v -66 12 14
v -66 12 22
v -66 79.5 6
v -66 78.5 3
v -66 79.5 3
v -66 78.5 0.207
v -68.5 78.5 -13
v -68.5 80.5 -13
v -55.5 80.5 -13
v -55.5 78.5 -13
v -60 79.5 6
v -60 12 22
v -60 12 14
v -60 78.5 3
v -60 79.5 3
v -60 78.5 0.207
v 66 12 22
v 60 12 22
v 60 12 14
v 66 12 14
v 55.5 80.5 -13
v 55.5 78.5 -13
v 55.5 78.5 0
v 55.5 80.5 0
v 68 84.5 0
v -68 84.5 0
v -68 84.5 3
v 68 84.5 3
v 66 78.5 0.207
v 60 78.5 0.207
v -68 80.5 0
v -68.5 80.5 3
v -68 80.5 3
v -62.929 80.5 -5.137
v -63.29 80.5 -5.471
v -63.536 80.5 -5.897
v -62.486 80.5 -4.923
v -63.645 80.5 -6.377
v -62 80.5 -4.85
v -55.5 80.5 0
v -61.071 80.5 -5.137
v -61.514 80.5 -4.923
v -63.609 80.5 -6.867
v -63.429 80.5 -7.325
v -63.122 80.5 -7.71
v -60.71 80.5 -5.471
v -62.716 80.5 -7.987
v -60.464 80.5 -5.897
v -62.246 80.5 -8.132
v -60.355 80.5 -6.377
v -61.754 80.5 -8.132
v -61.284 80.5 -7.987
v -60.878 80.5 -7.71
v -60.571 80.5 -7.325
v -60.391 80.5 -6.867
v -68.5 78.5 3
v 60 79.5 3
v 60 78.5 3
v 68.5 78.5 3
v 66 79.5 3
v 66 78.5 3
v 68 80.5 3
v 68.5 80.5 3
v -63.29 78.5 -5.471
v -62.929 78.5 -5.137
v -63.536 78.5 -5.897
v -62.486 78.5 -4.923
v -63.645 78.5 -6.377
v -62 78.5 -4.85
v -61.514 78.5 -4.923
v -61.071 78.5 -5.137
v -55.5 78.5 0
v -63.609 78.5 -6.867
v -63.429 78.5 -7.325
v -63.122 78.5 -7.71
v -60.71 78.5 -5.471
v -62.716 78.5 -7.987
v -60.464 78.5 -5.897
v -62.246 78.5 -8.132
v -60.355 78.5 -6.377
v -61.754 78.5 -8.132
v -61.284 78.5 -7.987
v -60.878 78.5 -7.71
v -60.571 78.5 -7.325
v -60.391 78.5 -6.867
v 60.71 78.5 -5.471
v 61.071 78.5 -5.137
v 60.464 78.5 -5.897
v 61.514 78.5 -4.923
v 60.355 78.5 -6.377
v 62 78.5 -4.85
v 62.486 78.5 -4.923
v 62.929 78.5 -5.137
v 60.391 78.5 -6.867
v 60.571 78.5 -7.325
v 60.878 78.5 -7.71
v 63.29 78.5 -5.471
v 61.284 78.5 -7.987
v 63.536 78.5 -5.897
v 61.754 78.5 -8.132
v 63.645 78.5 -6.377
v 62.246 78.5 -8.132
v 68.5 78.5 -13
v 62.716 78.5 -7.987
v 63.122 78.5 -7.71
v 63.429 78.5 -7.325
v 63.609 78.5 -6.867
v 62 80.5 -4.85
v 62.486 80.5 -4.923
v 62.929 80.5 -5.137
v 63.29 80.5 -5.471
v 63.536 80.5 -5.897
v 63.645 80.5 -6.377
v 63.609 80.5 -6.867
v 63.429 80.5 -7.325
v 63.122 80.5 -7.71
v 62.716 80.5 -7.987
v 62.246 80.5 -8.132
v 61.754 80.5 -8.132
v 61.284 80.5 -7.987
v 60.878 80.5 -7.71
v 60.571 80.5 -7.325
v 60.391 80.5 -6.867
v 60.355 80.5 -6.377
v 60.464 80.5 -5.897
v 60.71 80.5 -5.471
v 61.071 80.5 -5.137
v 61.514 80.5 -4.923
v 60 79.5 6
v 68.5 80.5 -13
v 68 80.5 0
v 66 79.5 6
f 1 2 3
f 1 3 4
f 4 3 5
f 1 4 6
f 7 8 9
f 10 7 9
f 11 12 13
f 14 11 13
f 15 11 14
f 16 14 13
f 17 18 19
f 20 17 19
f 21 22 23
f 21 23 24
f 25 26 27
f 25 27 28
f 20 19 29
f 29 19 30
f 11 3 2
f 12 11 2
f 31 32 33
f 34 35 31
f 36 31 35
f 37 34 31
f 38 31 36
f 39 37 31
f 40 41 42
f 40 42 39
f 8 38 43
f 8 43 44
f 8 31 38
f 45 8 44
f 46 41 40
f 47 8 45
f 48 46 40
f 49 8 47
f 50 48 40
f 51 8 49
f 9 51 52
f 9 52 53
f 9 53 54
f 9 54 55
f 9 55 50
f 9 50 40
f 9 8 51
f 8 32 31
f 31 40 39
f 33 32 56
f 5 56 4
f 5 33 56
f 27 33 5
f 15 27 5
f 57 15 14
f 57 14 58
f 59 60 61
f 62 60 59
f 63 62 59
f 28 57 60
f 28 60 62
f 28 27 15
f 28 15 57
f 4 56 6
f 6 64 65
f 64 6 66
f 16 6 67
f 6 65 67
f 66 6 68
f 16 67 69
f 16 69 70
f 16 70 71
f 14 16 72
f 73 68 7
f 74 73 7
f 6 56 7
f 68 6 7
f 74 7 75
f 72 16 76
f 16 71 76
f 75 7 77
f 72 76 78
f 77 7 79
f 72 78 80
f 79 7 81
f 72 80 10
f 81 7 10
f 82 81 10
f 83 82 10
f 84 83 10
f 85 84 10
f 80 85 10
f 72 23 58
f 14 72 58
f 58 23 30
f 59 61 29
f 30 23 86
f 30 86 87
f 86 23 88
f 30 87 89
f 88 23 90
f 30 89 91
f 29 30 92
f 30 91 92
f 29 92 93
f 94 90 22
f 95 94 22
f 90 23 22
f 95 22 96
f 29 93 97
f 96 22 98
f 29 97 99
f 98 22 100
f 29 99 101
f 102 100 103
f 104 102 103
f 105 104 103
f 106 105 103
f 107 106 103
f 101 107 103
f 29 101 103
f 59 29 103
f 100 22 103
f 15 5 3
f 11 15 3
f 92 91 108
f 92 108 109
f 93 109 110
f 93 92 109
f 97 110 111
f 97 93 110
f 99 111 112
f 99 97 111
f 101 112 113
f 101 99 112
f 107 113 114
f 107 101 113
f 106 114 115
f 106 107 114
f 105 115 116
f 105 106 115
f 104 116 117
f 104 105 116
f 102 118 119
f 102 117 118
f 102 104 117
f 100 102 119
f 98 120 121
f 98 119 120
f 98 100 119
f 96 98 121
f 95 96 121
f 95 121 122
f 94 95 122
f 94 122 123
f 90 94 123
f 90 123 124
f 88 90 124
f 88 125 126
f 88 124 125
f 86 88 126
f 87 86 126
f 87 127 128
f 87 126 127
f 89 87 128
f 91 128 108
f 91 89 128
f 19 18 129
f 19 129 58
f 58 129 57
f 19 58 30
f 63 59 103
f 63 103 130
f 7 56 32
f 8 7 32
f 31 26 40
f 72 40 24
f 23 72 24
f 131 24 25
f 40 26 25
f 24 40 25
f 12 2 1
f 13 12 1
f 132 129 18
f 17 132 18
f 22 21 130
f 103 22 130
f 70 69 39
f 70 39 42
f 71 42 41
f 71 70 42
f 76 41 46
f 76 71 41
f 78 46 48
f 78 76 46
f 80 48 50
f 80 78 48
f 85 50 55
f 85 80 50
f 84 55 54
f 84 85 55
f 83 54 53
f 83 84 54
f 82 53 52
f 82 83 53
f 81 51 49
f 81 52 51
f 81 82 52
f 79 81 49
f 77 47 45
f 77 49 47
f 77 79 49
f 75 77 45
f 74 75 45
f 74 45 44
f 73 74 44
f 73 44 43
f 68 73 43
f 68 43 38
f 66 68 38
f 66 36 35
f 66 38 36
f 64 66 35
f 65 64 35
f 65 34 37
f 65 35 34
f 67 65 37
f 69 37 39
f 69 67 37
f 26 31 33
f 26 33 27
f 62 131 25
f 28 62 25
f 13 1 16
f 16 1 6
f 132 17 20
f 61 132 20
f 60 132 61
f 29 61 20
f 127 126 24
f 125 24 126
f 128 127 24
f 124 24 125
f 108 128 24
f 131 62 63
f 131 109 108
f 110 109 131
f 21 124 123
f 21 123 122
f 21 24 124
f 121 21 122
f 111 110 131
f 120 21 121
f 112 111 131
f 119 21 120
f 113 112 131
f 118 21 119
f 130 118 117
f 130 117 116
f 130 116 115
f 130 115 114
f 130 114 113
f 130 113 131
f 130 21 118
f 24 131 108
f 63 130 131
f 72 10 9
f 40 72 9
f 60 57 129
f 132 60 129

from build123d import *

# Parameters (mm, degrees)
SKETCH_1_W                    = 136
SKETCH_1_H                    = 6
F_3MM_DEPTH                   = 3
EXTRUDE_START                 = -13
SKETCH_2_W                    = 13
SKETCH_2_H                    = 2
EXTRUDE_1_DEPTH               = 16
CUT_EXTRUDE_M3_1_DEPTH        = 100
CUT_EXTRUDE_M3_1_DEPTH_BACK   = 100
SKETCH_3_R                    = 1.65
SKETCH_4_W                    = 13
SKETCH_4_H                    = 2
EXTRUDE_1_2_DEPTH             = 16
CUT_EXTRUDE_M3_1_2_DEPTH      = 100
CUT_EXTRUDE_M3_1_2_DEPTH_BACK = 100
SKETCH_5_R                    = 1.65
F_6MM_1_START                 = -66
F_6MM_1_DEPTH                 = 6
F_6MM_1_START_2               = 60
F_6MM_1_2_DEPTH               = 6


with BuildPart() as part:
    # Sketch 1 → 3mm (new body)
    with BuildSketch(Plane.XY):
        with Locations((0, 81.5)):
            Rectangle(SKETCH_1_W, SKETCH_1_H)
    extrude(amount=F_3MM_DEPTH)

    # Sketch 2 → Extrude 1 (add)
    with BuildSketch(Plane.XY.offset(EXTRUDE_START)):
        with Locations((-62, 79.5)):
            Rectangle(SKETCH_2_W, SKETCH_2_H)
    extrude(amount=EXTRUDE_1_DEPTH)

    # Sketch 3 → Cut-Extrude M3_-1 (cut, two sides: drawn at the far end of the back side and taken through both)
    with BuildSketch(Plane(origin=(0, 0, 0), x_dir=(1, 0, 0), z_dir=(0, 1, 0)).offset(-CUT_EXTRUDE_M3_1_DEPTH_BACK)):
        with Locations(Location((-62, 6.5, 0), (0, 0, 270))):
            Circle(SKETCH_3_R)
    extrude(amount=CUT_EXTRUDE_M3_1_DEPTH + CUT_EXTRUDE_M3_1_DEPTH_BACK, mode=Mode.SUBTRACT)

    # Sketch 4 → Extrude 1 2 (add)
    with BuildSketch(Plane.XY.offset(EXTRUDE_START)):
        with Locations((62, 79.5)):
            Rectangle(SKETCH_4_W, SKETCH_4_H)
    extrude(amount=EXTRUDE_1_2_DEPTH)

    # Sketch 5 → Cut-Extrude M3_1 2 (cut, two sides: drawn at the far end of the back side and taken through both)
    with BuildSketch(Plane(origin=(0, 0, 0), x_dir=(1, 0, 0), z_dir=(0, 1, 0)).offset(-CUT_EXTRUDE_M3_1_2_DEPTH_BACK)):
        with Locations(Location((62, 6.5, 0), (0, 0, 270))):
            Circle(SKETCH_5_R)
    extrude(amount=CUT_EXTRUDE_M3_1_2_DEPTH + CUT_EXTRUDE_M3_1_2_DEPTH_BACK, mode=Mode.SUBTRACT)

    # Sketch 6 → 6mm_-1 (add)
    with BuildSketch(Plane(origin=(0, 0, 0), x_dir=(0, 0, -1), z_dir=(1, 0, 0)).offset(F_6MM_1_START)):
        Polygon((0, 79.5), (-6, 79.5), (-22, 12), (-14, 12), align=None)
    extrude(amount=F_6MM_1_DEPTH)

    # Sketch 7 → 6mm_1 2 (add)
    with BuildSketch(Plane(origin=(0, 0, 0), x_dir=(0, 0, -1), z_dir=(1, 0, 0)).offset(F_6MM_1_START_2)):
        Polygon((0, 79.5), (-6, 79.5), (-22, 12), (-14, 12), align=None)
    extrude(amount=F_6MM_1_2_DEPTH)


solid = part.part
